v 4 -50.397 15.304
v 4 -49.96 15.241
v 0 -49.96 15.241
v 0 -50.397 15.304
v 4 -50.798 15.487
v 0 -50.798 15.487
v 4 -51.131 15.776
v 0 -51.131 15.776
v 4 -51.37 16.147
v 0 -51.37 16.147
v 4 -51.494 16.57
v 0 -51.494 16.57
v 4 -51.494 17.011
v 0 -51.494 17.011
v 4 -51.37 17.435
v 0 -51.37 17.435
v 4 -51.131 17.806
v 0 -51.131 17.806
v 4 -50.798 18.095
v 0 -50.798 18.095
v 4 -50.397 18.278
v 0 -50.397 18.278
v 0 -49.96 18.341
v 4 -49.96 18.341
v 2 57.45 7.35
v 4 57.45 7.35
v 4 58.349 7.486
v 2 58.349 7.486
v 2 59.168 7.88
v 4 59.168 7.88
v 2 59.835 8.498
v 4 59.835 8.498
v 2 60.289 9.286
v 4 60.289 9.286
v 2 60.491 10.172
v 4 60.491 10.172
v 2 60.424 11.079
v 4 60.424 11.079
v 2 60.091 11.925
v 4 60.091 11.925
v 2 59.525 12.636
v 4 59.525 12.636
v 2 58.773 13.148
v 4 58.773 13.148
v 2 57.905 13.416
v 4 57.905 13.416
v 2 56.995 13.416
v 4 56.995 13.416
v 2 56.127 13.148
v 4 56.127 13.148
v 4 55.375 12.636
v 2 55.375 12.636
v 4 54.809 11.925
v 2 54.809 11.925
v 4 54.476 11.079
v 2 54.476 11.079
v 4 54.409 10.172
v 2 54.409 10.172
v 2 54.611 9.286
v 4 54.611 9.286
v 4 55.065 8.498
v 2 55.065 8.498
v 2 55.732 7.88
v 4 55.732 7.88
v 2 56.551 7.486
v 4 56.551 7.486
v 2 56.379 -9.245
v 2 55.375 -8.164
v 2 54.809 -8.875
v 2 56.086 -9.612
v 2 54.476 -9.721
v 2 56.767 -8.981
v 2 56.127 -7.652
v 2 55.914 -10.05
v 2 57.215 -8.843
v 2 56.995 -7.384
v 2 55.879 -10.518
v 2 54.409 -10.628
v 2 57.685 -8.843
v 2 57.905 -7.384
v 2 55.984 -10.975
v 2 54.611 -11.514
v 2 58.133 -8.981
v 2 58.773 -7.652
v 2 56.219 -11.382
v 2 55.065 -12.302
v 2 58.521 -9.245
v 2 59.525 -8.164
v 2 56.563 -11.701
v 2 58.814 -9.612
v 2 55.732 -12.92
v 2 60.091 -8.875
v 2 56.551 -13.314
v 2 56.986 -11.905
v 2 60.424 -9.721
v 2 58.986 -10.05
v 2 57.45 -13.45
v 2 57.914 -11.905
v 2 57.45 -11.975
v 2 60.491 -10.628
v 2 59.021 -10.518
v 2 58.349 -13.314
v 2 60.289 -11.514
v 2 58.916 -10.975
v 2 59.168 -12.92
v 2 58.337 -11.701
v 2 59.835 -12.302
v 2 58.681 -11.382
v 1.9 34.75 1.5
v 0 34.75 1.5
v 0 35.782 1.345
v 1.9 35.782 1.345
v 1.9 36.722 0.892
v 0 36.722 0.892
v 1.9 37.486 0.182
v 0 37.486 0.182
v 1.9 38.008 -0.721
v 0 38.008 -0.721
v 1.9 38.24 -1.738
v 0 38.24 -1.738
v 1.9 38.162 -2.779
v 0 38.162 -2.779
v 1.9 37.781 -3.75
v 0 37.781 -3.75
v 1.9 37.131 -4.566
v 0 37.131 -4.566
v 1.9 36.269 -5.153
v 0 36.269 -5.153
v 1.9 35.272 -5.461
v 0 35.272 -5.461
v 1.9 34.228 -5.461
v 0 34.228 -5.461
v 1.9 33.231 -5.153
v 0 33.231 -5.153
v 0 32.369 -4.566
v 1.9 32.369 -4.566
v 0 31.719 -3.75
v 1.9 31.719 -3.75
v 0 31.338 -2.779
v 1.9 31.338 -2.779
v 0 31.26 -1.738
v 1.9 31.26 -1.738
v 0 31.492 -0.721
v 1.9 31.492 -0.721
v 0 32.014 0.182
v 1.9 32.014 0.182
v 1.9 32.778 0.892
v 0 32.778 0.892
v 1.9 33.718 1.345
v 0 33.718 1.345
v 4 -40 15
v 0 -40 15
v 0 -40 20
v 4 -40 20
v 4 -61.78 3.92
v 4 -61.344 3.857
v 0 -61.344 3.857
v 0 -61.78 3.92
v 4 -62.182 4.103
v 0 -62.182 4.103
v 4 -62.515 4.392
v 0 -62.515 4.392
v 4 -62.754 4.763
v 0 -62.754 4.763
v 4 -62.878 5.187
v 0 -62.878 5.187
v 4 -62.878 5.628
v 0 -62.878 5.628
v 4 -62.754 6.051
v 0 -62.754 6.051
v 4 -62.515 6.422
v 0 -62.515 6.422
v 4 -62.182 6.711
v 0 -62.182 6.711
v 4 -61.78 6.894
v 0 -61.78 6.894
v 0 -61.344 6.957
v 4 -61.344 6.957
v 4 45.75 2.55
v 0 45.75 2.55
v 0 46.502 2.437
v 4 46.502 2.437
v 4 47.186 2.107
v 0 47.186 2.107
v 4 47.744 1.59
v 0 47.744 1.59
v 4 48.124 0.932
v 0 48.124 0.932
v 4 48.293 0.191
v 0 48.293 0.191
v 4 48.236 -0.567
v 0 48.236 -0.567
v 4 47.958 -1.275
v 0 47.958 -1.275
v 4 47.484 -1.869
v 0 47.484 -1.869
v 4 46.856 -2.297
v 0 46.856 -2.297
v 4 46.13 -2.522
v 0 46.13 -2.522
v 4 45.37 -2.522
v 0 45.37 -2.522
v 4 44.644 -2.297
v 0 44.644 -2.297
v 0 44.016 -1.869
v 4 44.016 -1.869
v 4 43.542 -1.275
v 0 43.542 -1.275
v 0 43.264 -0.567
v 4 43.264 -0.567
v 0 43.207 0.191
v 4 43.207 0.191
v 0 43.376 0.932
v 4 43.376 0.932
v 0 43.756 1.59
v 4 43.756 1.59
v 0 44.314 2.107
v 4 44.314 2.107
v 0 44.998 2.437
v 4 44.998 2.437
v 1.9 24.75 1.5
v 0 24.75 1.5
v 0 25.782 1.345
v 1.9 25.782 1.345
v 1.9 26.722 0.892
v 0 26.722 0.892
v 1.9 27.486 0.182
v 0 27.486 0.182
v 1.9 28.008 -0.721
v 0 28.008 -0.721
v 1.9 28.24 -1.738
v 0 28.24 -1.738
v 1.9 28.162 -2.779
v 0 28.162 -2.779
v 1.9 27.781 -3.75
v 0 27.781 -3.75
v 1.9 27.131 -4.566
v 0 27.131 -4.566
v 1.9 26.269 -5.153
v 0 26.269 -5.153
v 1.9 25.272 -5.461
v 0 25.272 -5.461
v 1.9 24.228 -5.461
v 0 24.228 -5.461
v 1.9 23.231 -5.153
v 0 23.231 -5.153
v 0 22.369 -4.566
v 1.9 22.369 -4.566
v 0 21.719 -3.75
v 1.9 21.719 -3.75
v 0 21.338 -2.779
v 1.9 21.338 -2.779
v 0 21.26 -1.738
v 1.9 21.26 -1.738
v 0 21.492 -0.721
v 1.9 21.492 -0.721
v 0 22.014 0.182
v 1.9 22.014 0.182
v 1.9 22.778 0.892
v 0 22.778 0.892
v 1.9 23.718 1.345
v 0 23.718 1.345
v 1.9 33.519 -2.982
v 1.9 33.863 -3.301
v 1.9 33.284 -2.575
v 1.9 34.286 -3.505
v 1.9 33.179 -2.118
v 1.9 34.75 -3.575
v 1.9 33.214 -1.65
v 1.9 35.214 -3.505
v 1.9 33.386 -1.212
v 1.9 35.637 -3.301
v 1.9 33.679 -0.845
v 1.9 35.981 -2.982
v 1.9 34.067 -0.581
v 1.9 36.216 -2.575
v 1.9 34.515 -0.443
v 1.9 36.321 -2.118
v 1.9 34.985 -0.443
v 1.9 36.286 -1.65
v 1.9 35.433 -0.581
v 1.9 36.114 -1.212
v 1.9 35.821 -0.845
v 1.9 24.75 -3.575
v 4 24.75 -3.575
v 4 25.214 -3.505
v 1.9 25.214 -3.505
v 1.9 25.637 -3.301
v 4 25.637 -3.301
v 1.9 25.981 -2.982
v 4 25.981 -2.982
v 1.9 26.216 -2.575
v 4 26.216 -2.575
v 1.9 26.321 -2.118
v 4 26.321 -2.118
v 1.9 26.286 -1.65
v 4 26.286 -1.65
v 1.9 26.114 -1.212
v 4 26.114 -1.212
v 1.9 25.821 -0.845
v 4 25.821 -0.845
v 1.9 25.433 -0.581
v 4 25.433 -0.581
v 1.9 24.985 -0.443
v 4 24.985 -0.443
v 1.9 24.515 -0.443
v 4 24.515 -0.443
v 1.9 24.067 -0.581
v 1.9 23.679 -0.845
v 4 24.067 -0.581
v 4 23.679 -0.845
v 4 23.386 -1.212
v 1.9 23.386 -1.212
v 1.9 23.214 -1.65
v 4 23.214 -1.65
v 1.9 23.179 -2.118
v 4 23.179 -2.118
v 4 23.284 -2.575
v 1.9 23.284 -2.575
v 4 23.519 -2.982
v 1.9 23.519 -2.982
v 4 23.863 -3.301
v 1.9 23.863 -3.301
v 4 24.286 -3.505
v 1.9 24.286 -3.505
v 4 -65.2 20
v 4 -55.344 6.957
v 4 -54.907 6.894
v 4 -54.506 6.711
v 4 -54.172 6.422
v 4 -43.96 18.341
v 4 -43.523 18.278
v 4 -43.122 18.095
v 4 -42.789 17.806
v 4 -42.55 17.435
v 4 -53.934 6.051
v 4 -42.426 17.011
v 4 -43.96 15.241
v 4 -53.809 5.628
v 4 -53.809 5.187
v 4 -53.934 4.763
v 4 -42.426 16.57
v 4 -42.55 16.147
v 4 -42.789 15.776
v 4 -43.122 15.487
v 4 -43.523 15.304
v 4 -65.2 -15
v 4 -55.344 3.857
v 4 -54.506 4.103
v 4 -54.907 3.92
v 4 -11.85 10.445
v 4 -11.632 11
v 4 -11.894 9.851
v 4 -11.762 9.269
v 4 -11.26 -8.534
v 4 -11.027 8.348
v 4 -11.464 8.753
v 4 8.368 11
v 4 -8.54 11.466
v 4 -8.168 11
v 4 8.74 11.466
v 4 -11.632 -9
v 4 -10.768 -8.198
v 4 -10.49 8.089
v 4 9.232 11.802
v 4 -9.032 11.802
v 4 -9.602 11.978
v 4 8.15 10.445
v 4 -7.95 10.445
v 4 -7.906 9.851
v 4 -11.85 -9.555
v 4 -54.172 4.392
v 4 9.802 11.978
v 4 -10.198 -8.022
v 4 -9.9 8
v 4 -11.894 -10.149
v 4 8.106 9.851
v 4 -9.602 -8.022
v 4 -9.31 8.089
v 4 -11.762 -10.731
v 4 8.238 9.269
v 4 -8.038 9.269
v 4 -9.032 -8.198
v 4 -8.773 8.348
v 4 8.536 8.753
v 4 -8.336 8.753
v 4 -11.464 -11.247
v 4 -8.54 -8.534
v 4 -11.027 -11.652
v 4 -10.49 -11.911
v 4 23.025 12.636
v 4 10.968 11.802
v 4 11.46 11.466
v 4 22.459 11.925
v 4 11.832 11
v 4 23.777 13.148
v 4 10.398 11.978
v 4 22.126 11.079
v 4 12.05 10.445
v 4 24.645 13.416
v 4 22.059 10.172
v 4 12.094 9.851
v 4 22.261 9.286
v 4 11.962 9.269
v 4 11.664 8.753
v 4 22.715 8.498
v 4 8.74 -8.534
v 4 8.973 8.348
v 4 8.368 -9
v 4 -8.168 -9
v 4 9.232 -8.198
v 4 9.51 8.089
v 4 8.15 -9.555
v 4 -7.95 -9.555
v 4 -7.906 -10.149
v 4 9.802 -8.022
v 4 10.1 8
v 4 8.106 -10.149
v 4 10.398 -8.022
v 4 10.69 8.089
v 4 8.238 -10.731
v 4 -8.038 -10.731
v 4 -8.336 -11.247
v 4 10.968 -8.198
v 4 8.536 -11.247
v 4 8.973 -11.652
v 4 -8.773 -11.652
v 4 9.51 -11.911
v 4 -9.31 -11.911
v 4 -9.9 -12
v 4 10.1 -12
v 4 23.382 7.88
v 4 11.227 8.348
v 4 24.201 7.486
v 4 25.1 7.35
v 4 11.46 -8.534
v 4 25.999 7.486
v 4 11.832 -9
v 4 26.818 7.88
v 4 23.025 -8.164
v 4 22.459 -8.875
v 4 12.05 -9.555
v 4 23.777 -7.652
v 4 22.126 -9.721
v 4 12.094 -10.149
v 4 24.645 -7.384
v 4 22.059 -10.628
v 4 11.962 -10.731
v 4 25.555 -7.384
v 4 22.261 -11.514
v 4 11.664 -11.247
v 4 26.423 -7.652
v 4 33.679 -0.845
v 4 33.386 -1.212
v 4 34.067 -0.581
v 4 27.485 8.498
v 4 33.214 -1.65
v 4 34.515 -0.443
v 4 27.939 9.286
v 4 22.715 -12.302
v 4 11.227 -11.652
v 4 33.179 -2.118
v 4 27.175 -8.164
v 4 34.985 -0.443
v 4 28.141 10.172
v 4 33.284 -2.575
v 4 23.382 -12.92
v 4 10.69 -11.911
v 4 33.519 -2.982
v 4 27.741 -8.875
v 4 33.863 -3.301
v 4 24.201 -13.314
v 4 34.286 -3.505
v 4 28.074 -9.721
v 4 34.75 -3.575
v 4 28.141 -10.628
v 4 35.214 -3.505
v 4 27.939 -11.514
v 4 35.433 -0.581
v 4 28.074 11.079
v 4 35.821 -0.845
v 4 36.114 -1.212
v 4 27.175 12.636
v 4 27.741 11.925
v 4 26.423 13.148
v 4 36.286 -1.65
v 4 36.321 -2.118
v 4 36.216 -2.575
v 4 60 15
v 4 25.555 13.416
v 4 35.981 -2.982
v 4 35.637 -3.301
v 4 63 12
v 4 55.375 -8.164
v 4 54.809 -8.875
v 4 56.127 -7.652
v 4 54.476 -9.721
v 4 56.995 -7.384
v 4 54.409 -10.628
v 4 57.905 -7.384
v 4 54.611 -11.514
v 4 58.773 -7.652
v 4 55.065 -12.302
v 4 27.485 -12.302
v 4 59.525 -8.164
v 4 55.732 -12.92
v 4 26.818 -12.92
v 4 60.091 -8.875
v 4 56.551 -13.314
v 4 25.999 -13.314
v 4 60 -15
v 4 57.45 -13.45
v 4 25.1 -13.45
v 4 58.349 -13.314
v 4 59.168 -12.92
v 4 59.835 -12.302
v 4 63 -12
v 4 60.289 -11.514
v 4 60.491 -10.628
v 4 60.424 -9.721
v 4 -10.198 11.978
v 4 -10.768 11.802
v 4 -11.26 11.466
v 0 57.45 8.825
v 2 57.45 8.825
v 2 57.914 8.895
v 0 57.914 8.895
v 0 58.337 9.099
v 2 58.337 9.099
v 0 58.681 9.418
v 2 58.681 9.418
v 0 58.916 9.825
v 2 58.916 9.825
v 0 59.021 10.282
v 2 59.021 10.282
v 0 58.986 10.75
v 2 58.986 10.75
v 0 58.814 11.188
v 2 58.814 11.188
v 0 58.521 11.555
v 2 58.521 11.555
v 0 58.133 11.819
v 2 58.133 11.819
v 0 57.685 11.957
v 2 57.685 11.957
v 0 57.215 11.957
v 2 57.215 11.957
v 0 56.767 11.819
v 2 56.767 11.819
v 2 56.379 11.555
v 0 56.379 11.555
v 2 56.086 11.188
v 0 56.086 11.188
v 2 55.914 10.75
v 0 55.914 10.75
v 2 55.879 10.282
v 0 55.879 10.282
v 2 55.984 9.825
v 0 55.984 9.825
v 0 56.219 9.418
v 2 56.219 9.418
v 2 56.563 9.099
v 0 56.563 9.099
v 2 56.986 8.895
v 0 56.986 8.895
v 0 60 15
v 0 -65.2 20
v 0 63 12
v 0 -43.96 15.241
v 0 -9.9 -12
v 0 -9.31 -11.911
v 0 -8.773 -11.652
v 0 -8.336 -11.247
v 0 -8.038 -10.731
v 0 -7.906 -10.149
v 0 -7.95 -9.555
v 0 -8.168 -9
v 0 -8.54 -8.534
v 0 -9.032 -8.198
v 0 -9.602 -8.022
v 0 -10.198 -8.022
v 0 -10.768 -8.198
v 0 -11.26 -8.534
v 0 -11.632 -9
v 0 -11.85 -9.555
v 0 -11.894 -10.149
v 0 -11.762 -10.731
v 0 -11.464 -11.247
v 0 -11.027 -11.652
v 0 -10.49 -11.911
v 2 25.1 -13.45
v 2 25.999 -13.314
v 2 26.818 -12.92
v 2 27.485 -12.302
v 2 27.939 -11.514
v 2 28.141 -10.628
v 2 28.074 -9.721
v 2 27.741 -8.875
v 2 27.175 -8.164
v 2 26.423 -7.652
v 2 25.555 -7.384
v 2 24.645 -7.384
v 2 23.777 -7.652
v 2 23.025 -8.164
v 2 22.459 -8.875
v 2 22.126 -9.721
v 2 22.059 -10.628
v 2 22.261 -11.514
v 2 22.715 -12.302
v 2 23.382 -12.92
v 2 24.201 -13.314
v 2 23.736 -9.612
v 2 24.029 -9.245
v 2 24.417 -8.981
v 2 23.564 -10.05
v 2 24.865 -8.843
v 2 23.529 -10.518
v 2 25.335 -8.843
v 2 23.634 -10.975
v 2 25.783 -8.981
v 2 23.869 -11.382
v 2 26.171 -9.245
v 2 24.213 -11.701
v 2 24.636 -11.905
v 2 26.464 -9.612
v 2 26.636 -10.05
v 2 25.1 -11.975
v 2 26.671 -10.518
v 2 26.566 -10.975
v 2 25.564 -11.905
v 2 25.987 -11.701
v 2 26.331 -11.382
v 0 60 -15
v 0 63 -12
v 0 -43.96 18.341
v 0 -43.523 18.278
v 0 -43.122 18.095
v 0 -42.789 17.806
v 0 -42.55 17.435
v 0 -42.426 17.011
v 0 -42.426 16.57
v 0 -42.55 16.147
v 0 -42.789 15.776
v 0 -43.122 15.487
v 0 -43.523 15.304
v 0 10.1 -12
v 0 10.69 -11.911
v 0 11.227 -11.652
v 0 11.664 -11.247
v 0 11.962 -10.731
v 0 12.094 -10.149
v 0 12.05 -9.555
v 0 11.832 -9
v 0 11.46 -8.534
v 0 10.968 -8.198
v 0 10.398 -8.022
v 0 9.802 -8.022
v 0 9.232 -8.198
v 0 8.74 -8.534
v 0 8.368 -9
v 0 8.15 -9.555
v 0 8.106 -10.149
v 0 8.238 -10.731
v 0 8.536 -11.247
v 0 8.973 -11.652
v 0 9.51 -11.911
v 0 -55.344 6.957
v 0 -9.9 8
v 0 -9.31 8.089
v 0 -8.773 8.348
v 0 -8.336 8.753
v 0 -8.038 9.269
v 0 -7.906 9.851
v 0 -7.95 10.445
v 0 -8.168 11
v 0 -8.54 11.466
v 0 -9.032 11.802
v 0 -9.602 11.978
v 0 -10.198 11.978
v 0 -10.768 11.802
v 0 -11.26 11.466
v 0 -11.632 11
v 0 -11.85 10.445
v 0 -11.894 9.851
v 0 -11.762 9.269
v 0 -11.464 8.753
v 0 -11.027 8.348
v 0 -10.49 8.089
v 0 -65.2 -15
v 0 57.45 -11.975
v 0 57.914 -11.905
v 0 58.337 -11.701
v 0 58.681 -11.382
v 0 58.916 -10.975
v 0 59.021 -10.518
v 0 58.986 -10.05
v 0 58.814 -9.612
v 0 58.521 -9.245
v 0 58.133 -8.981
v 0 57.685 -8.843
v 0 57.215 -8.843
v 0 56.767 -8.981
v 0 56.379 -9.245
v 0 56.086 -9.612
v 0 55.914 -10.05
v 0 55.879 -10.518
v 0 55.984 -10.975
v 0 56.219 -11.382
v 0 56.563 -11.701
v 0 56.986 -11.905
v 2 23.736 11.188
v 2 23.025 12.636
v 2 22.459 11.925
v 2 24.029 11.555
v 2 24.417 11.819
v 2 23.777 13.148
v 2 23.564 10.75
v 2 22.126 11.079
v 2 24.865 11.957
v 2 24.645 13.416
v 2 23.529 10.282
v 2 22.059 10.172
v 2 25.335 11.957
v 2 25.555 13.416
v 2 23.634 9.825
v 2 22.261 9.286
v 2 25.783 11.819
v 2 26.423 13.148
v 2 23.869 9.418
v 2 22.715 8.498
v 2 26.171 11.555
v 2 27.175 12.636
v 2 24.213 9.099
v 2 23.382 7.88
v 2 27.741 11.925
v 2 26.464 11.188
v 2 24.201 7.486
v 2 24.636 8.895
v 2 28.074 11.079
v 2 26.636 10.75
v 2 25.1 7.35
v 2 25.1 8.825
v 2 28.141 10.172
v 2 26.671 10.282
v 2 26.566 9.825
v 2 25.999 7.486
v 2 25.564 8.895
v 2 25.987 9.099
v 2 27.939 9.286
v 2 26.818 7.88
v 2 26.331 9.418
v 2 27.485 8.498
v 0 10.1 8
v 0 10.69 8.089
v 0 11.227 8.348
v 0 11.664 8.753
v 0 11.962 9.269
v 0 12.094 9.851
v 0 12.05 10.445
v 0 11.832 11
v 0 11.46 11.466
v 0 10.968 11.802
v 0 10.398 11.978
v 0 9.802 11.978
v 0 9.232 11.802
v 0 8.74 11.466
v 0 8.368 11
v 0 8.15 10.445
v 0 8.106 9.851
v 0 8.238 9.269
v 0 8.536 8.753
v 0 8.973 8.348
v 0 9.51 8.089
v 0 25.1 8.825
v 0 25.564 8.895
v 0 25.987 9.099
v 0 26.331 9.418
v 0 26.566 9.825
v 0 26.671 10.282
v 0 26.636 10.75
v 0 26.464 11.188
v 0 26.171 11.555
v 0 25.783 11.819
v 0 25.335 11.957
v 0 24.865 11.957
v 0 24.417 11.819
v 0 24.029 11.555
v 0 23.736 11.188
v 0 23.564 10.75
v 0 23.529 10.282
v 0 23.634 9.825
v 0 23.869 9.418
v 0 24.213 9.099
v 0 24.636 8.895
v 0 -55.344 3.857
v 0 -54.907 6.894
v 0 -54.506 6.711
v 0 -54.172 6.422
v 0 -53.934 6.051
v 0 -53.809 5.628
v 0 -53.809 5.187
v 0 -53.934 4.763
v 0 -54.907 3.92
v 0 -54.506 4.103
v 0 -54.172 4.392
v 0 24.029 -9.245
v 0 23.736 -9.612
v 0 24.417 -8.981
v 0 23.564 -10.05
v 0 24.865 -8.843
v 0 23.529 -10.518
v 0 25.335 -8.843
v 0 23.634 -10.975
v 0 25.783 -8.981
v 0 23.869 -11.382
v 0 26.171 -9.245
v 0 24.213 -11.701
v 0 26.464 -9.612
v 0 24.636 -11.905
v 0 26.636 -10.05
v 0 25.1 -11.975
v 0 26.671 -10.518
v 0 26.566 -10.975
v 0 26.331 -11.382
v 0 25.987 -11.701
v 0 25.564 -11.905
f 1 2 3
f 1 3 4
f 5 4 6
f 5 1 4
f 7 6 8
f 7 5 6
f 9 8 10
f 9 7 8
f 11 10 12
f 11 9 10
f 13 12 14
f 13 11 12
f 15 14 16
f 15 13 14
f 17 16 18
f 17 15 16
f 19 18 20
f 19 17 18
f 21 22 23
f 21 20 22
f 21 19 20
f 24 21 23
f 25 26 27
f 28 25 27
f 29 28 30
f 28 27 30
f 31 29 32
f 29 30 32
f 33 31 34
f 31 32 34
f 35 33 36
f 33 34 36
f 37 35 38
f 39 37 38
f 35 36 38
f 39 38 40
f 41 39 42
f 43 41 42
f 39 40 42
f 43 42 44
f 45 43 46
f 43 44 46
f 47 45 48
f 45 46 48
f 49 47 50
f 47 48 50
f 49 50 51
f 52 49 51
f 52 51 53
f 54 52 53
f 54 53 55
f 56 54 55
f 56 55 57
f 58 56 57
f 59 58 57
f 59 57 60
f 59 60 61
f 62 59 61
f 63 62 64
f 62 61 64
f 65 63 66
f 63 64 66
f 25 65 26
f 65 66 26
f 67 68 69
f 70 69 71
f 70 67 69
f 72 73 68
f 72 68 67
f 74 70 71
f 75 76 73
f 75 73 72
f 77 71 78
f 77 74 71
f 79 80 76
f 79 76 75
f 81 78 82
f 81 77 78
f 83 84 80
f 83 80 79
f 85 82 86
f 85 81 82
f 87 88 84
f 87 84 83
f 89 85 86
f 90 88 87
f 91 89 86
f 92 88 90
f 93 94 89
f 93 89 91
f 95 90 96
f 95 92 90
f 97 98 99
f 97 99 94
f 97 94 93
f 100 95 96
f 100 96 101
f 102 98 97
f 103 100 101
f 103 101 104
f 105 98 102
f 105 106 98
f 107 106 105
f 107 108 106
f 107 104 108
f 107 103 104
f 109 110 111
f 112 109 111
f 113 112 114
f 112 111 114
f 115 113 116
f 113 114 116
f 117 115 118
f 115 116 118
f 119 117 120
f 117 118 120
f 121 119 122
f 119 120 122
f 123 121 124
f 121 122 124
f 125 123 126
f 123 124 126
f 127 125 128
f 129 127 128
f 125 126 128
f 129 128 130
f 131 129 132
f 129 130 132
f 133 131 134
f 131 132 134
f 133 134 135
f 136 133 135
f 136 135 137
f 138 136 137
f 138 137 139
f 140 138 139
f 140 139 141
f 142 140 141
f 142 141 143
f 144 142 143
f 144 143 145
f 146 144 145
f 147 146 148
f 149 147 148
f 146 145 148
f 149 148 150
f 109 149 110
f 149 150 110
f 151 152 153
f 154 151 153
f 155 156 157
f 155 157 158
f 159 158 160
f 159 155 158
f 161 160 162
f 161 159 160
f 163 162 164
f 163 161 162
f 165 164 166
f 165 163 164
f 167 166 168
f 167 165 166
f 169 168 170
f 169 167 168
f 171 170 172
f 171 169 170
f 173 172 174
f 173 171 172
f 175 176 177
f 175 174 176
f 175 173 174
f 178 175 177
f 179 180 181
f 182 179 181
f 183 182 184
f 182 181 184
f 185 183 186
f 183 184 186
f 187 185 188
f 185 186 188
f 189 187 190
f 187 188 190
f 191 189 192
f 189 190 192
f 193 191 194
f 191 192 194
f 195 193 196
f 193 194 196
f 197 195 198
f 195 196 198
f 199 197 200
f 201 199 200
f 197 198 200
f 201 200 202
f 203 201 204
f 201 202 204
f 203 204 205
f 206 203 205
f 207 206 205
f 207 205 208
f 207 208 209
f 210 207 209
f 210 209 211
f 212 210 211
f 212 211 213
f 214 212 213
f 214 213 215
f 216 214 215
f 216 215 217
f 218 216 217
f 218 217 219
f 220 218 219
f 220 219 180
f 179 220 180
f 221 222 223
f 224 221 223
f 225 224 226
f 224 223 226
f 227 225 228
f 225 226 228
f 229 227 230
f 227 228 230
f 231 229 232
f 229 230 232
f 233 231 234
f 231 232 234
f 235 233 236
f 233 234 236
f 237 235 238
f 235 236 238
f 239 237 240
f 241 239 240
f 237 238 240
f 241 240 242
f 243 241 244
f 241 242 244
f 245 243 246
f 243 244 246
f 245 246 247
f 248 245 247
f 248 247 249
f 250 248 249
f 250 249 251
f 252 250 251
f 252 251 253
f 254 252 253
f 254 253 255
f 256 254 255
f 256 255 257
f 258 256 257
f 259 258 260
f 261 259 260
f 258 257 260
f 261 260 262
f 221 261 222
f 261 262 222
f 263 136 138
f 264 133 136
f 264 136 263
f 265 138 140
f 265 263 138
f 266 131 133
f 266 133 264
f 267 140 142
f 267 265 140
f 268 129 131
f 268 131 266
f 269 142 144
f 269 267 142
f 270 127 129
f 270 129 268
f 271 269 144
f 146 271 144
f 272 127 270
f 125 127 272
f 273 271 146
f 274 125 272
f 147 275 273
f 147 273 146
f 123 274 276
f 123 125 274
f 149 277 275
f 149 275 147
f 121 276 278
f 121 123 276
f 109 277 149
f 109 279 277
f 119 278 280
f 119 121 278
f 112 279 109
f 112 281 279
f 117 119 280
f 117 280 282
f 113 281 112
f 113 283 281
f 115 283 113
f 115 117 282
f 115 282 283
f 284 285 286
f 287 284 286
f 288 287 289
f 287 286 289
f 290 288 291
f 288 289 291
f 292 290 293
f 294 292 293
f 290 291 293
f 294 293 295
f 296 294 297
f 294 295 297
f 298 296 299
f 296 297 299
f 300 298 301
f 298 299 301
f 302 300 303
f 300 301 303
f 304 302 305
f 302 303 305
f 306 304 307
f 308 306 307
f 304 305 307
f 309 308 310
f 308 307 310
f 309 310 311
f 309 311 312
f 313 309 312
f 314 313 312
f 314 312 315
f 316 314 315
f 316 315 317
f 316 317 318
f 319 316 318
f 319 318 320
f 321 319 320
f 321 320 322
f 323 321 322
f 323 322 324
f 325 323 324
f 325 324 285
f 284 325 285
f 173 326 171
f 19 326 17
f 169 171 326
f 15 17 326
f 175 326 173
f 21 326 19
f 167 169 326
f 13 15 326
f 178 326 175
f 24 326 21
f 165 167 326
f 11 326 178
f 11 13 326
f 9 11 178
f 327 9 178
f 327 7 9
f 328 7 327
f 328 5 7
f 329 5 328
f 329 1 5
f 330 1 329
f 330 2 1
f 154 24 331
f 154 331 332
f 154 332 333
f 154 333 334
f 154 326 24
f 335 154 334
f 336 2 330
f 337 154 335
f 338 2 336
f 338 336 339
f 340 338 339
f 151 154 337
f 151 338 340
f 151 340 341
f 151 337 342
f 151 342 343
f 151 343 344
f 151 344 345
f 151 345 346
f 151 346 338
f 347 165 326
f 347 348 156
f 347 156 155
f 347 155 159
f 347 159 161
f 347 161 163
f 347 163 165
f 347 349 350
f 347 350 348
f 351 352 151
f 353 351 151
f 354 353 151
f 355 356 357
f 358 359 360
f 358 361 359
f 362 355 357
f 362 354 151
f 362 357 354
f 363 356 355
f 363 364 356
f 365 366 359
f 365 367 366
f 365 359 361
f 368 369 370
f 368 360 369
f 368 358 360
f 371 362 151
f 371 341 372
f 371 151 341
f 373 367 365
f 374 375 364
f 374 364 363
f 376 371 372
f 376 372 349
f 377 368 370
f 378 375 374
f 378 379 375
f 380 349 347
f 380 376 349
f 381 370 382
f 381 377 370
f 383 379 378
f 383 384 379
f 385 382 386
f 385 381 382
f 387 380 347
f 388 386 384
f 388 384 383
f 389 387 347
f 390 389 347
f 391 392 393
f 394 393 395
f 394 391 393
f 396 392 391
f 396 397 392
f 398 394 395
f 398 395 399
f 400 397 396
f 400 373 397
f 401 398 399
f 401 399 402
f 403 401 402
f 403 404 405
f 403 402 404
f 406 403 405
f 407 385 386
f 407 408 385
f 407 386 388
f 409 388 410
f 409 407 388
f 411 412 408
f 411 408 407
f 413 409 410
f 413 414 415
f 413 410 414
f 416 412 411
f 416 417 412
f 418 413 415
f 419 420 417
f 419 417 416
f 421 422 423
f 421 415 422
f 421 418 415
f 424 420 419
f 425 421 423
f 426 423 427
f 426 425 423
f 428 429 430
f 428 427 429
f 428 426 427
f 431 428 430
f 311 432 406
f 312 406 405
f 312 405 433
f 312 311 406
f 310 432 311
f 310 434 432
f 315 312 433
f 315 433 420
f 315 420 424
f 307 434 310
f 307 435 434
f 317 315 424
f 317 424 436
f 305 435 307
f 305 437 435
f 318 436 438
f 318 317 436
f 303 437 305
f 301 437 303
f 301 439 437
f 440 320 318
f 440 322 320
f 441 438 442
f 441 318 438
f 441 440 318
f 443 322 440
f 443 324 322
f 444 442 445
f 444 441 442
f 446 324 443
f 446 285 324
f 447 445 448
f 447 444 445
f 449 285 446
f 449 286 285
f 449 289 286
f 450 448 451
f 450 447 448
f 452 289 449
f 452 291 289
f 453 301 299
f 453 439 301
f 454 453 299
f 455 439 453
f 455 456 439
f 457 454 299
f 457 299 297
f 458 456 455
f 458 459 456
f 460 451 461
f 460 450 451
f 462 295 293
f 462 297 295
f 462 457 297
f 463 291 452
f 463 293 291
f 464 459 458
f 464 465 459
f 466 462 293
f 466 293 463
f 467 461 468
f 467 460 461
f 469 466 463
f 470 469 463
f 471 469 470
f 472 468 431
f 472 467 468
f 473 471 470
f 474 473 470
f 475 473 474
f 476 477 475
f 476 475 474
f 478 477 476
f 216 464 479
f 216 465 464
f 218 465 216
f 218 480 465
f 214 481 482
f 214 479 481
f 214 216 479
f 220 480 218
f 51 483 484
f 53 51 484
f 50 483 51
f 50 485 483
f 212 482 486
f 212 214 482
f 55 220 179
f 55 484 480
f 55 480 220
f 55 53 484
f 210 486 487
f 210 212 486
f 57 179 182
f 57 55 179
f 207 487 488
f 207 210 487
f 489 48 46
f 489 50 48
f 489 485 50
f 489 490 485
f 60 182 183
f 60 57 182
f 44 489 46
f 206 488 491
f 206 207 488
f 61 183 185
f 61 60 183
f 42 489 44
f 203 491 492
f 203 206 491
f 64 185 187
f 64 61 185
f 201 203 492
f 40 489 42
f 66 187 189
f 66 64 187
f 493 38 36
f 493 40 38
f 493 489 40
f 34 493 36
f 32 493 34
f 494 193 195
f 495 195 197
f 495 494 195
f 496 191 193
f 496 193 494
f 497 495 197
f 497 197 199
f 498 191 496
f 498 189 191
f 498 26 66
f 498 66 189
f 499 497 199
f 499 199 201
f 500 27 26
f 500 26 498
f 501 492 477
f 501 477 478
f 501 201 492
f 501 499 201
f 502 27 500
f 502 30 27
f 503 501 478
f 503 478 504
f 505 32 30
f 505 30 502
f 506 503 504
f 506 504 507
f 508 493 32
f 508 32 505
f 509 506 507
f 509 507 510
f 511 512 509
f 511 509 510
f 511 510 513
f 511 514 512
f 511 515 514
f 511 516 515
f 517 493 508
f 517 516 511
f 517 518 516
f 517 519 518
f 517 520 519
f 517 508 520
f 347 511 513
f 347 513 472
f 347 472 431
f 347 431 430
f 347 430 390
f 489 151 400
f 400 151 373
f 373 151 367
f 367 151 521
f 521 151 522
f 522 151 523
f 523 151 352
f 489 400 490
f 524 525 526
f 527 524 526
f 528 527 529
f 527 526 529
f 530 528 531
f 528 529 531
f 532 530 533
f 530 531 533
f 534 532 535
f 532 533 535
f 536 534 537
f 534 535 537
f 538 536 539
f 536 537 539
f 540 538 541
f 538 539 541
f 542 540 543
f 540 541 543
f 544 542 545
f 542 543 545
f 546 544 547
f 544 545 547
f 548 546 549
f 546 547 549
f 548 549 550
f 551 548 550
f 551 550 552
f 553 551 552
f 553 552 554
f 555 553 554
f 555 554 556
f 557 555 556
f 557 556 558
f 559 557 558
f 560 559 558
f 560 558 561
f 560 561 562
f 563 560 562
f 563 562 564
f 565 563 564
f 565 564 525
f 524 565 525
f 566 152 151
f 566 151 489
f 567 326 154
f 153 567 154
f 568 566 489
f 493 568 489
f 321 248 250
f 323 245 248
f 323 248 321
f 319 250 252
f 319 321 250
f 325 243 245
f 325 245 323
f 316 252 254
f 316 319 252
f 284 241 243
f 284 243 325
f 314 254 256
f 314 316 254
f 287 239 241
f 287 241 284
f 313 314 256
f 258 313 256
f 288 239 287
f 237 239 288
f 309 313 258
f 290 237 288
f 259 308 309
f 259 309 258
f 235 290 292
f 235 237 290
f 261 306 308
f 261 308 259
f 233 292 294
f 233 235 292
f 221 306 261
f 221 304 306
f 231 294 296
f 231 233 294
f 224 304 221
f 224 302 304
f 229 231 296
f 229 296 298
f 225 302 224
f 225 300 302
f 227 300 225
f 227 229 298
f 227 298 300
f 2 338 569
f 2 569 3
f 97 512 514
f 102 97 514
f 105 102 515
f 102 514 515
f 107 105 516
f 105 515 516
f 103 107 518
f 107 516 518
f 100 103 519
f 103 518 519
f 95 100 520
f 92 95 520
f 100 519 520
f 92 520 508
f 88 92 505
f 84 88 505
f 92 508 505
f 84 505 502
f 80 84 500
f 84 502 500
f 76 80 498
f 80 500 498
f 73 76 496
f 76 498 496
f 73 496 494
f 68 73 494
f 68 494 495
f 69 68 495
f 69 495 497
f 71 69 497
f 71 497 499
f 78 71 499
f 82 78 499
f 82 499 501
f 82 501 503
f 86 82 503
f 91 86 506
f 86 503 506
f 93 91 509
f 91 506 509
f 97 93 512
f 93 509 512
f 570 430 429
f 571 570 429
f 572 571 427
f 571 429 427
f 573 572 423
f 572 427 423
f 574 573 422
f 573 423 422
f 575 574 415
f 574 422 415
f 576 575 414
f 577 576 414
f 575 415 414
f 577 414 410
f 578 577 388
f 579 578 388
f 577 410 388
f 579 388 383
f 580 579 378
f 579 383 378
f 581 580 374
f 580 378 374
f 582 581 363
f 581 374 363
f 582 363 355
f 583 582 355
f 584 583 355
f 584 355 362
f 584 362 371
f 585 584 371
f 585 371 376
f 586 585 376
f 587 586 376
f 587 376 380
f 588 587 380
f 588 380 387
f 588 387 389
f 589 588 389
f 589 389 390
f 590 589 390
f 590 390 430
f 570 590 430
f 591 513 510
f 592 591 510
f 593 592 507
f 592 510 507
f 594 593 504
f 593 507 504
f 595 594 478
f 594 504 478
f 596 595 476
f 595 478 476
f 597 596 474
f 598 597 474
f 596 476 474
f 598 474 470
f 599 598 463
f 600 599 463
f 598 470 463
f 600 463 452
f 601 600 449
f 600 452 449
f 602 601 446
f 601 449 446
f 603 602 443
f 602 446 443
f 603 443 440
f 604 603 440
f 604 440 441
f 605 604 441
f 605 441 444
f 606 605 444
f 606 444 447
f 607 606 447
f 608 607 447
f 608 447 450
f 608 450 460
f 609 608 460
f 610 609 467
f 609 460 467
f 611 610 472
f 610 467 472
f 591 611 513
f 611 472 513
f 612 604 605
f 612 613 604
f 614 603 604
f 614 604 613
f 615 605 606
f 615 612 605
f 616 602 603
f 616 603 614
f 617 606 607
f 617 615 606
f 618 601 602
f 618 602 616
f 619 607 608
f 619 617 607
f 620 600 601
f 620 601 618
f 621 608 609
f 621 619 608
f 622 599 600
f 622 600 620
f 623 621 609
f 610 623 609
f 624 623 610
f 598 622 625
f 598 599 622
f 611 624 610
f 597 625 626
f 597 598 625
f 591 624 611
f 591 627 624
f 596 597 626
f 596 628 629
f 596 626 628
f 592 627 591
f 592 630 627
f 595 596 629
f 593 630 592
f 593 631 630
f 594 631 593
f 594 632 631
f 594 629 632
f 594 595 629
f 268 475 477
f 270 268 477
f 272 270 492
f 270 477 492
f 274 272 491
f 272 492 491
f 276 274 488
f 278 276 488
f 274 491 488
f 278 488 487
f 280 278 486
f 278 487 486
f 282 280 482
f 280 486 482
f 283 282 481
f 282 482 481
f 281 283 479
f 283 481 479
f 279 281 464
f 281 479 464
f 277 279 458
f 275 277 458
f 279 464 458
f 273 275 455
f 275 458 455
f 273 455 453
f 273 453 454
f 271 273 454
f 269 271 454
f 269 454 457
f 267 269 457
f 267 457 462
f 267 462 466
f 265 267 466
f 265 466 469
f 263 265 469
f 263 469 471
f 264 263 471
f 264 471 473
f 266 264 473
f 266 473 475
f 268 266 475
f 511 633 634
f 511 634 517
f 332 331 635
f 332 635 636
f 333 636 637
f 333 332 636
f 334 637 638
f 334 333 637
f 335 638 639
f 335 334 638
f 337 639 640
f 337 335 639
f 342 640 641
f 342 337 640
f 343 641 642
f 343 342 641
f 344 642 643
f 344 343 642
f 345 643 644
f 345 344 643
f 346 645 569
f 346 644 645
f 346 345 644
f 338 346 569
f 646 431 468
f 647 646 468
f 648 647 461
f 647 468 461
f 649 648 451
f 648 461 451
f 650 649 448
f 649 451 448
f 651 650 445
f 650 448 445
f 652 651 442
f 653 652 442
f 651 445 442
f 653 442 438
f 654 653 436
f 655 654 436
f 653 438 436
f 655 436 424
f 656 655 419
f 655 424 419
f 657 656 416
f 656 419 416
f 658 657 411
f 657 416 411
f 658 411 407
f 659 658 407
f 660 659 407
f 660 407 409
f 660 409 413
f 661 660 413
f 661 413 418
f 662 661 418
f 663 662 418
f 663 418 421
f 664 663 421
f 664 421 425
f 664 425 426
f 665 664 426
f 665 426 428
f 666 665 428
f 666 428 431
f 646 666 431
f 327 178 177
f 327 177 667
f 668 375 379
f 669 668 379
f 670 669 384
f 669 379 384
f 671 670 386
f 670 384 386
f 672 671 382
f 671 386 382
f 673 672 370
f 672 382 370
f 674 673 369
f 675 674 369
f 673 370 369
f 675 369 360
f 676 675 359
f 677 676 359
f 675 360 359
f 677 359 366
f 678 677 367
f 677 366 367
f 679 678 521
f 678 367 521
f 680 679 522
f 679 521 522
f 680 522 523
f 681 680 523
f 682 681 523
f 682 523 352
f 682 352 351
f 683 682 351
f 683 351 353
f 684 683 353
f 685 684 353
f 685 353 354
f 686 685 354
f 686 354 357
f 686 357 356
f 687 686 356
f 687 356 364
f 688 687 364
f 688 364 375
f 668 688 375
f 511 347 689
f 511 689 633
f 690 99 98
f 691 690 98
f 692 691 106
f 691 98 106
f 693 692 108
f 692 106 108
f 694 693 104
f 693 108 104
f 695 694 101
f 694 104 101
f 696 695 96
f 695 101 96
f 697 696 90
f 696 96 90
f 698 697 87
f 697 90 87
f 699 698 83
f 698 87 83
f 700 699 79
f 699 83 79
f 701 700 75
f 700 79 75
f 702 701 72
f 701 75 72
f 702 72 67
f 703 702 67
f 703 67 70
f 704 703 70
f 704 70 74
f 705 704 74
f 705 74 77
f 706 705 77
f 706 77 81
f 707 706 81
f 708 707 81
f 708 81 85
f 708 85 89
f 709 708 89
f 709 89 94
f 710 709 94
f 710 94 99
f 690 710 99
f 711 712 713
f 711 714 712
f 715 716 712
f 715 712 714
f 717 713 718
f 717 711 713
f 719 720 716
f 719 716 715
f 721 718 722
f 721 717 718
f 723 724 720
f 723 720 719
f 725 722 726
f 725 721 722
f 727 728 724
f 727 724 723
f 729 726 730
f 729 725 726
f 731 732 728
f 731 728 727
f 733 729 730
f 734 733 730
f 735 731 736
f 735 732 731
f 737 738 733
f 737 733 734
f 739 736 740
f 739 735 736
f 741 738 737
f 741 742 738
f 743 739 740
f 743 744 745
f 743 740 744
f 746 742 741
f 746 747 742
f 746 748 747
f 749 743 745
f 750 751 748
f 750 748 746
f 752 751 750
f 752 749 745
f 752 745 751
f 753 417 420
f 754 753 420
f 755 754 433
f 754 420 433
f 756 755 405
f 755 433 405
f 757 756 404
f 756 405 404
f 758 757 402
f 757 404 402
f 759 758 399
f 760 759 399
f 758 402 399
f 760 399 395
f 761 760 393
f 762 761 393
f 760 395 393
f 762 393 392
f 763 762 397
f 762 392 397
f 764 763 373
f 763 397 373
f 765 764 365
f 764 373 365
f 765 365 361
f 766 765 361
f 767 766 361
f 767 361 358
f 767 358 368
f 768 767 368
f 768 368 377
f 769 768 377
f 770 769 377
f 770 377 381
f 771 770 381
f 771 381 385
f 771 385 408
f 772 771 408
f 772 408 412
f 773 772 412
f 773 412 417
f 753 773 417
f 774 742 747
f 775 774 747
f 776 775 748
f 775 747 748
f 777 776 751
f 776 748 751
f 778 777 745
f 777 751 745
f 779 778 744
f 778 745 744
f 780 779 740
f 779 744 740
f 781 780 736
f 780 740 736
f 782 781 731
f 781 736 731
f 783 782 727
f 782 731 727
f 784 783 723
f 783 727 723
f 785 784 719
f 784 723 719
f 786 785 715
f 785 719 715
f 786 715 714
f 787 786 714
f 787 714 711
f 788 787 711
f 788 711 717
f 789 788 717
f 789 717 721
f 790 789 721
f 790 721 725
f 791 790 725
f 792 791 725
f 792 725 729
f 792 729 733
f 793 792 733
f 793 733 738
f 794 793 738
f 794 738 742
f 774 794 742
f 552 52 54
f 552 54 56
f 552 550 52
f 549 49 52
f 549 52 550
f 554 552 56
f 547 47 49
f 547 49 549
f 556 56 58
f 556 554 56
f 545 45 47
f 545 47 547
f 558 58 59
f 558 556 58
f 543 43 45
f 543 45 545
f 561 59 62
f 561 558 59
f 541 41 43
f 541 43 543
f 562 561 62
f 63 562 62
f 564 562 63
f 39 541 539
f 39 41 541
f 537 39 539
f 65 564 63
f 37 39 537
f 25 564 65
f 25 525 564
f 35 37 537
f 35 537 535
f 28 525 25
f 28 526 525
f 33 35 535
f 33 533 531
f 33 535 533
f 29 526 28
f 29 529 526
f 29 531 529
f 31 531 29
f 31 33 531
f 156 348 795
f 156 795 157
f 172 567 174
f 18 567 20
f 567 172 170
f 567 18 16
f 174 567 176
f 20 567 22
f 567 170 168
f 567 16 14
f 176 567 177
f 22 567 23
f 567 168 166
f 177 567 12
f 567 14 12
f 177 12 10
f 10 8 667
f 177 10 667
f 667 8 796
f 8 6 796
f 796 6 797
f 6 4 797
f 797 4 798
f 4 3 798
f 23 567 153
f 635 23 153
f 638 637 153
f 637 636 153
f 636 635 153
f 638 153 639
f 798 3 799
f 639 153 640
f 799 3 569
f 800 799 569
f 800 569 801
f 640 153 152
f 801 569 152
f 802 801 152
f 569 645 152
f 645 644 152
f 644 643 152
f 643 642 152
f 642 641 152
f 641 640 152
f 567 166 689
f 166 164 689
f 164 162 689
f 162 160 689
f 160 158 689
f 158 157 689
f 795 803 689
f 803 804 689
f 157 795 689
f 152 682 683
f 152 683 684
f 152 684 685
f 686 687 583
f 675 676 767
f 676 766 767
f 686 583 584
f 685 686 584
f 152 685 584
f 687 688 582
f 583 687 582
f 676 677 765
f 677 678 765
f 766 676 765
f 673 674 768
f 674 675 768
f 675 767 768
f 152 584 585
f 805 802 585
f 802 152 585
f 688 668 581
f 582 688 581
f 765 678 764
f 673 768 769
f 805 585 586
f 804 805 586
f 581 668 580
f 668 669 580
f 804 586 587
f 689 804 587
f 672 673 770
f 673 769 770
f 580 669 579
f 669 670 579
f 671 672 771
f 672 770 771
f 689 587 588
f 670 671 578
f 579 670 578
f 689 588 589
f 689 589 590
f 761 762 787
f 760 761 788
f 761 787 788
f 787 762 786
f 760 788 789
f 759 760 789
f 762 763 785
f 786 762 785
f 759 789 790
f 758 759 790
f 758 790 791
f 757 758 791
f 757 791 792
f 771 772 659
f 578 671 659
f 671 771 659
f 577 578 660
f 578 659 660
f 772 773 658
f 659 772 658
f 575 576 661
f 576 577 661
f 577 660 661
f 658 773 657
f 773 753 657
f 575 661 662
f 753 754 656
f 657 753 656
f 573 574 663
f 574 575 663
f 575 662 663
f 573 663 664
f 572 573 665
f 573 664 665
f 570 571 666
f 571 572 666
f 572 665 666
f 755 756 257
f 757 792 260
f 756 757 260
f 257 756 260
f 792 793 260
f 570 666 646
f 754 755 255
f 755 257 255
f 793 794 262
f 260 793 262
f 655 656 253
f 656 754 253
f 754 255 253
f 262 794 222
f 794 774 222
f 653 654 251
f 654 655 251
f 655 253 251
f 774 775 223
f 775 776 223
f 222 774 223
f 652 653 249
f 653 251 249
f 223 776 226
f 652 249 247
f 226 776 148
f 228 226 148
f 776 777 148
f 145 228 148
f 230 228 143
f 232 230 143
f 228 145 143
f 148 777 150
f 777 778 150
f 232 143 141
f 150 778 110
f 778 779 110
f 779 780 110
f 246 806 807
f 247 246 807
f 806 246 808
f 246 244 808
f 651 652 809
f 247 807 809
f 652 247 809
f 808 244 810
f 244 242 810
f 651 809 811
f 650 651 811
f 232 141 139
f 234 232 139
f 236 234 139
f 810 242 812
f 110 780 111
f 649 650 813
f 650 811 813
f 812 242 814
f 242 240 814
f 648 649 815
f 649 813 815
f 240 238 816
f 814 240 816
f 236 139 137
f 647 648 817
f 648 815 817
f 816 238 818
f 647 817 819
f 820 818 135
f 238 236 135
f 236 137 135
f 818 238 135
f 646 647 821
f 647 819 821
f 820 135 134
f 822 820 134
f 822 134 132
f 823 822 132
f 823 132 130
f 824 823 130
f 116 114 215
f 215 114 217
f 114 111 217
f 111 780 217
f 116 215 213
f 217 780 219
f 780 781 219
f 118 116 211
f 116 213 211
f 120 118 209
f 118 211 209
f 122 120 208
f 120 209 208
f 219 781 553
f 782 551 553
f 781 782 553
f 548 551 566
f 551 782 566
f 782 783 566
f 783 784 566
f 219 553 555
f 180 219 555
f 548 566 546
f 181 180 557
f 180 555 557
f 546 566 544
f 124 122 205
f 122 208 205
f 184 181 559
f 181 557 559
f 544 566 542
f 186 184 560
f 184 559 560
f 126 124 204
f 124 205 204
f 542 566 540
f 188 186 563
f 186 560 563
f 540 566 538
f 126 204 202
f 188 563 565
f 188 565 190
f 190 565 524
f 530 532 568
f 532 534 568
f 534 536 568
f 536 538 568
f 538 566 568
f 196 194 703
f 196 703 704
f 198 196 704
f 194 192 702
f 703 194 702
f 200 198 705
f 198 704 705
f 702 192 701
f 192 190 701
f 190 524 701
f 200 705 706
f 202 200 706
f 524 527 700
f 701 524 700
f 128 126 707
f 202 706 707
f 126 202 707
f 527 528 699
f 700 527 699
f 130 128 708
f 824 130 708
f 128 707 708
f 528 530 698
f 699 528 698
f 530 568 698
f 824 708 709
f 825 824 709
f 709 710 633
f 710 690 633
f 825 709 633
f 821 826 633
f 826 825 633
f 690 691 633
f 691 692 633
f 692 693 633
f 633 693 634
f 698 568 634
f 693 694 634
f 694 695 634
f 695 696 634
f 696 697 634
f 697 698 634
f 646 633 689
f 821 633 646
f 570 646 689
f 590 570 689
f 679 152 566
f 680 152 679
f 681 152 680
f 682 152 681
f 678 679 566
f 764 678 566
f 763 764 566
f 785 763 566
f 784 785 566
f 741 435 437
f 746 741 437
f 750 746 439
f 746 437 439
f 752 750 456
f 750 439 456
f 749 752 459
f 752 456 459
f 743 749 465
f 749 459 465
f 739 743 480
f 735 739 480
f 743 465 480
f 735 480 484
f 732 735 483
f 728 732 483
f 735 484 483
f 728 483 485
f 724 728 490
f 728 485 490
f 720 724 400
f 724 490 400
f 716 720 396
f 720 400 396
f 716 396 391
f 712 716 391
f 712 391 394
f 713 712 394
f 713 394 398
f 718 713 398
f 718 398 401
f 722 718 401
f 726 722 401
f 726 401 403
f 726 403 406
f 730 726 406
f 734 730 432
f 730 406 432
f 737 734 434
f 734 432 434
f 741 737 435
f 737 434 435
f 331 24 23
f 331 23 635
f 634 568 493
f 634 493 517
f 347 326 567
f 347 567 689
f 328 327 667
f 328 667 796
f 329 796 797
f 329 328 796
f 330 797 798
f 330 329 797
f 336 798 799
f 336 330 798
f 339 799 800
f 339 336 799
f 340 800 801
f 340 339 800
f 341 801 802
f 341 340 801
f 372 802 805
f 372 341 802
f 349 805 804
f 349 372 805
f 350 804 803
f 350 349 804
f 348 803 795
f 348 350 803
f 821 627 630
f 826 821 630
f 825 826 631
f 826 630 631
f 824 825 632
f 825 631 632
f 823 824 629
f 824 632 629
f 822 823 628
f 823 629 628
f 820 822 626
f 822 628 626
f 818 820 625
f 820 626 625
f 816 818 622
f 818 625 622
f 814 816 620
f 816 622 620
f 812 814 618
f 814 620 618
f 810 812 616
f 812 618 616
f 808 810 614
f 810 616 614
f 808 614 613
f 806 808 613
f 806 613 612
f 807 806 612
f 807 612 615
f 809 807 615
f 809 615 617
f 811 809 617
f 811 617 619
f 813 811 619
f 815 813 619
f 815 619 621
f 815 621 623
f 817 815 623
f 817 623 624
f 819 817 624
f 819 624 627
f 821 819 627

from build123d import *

# Parameters (mm, degrees)
CROQUIS1_W              = 30
CROQUIS1_H              = 126
SALIENTE_EXTRUIR1_DEPTH = 4
CROQUIS3_R              = 2
CORTAR_EXTRUIR2_DEPTH   = 5
CROQUIS8_R              = 2.55
CORTAR_EXTRUIR3_DEPTH   = 5
CROQUIS21_W             = 5
CROQUIS21_H             = 23
SALIENTE_EXTRUIR2_DEPTH = 4
CORTAR_EXTRUIR16_DEPTH  = 5
CROQUIS11_R             = 1.575
CORTAR_EXTRUIR8_DEPTH   = 5
CROQUIS15_R             = 1.575
CORTAR_EXTRUIR11_DEPTH  = 5
CHAFL_N2_SIZE           = 3
CROQUIS19_R             = 3.5
CORTAR_EXTRUIR13_DEPTH  = 1.9
CROQUIS20_R             = 3.05
CORTAR_EXTRUIR14_DEPTH  = 2
CROQUIS24_W             = 35
CROQUIS24_H             = 2.2
SALIENTE_EXTRUIR3_DEPTH = 4


with BuildPart() as part:
    # Croquis1 → Saliente-Extruir1 (new body)
    with BuildSketch(Plane(origin=(0, 0, 0), x_dir=(0, 0, -1), z_dir=(1, 0, 0))):
        Rectangle(CROQUIS1_W, CROQUIS1_H)
    extrude(amount=SALIENTE_EXTRUIR1_DEPTH)

    # Croquis3 → Cortar-Extruir2 (cut, through all)
    with BuildSketch(Plane(origin=(4, 0, 0), x_dir=(0, 0, -1), z_dir=(1, 0, 0))):
        with Locations((-10, 10.1)):
            Circle(CROQUIS3_R)
        with Locations((10, 10.1)):
            Circle(CROQUIS3_R)
        with Locations((-10, -9.9)):
            Circle(CROQUIS3_R)
        with Locations((10, -9.9)):
            Circle(CROQUIS3_R)
    extrude(amount=-CORTAR_EXTRUIR2_DEPTH, mode=Mode.SUBTRACT)

    # Croquis8 → Cortar-Extruir3 (cut, through all)
    with BuildSketch(Plane.ZY):
        with Locations((0, 45.75)):
            Circle(CROQUIS8_R)
    extrude(amount=-CORTAR_EXTRUIR3_DEPTH, mode=Mode.SUBTRACT)

    # Croquis21 → Saliente-Extruir2 (add)
    with BuildSketch(Plane.ZY):
        with Locations((17.5, -51.5)):
            Rectangle(CROQUIS21_W, CROQUIS21_H)
    extrude(amount=-SALIENTE_EXTRUIR2_DEPTH)

    # Croquis23 → Cortar-Extruir16 (cut, through all)
    with BuildSketch(Plane(origin=(4, 0, 0), x_dir=(0, 0, -1), z_dir=(1, 0, 0))):
        with BuildLine():
            Line((-15.240890395, -43.96), (-15.240890395, -49.96))
            ThreePointArc((-15.240890395, -49.96), (-16.790890395, -51.51), (-18.340890395, -49.96))
            Line((-18.340890395, -49.96), (-18.340890395, -43.96))
            ThreePointArc((-18.340890395, -43.96), (-16.790890395, -42.41), (-15.240890395, -43.96))
        make_face()
        with BuildLine():
            Line((-3.857181896, -55.343708499), (-3.857181896, -61.343708499))
            ThreePointArc((-3.857181896, -61.343708499), (-5.407181896, -62.893708499), (-6.957181896, -61.343708499))
            Line((-6.957181896, -61.343708499), (-6.957181896, -55.343708499))
            ThreePointArc((-6.957181896, -55.343708499), (-5.407181896, -53.793708499), (-3.857181896, -55.343708499))
        make_face()
    extrude(amount=-CORTAR_EXTRUIR16_DEPTH, mode=Mode.SUBTRACT)

    # Croquis11 → Cortar-Extruir8 (cut, through all)
    with BuildSketch(Plane(origin=(4, 0, 0), x_dir=(0, 0, -1), z_dir=(1, 0, 0))):
        with Locations((2, 34.75)):
            Circle(CROQUIS11_R)
        with Locations((2, 24.75)):
            Circle(CROQUIS11_R)
    extrude(amount=-CORTAR_EXTRUIR8_DEPTH, mode=Mode.SUBTRACT)

    # Croquis15 → Cortar-Extruir11 (cut, through all)
    with BuildSketch(Plane(origin=(4, 0, 0), x_dir=(0, 0, -1), z_dir=(1, 0, 0))):
        with Locations((-10.4, 57.45)):
            Circle(CROQUIS15_R)
        with Locations((10.4, 57.45)):
            Circle(CROQUIS15_R)
        with Locations((-10.4, 25.1)):
            Circle(CROQUIS15_R)
        with Locations((10.4, 25.1)):
            Circle(CROQUIS15_R)
    extrude(amount=-CORTAR_EXTRUIR11_DEPTH, mode=Mode.SUBTRACT)

    # Chaflán2
    chafl_n2_edges = [part.edges().sort_by_distance(p)[0] for p in [
        (2, 63, -15),
        (2, 63, 15),
    ]]
    chamfer(chafl_n2_edges, length=CHAFL_N2_SIZE)

    # Croquis19 → Cortar-Extruir13 (cut)
    with BuildSketch(Plane.ZY):
        with Locations((-2, 24.75)):
            Circle(CROQUIS19_R)
        with Locations((-2, 34.75)):
            Circle(CROQUIS19_R)
    extrude(amount=-CORTAR_EXTRUIR13_DEPTH, mode=Mode.SUBTRACT)

    # Croquis20 → Cortar-Extruir14 (cut)
    with BuildSketch(Plane(origin=(4, 0, 0), x_dir=(0, 0, -1), z_dir=(1, 0, 0))):
        with Locations((-10.4, 57.45)):
            Circle(CROQUIS20_R)
        with Locations((10.4, 57.45)):
            Circle(CROQUIS20_R)
        with Locations((10.4, 25.1)):
            Circle(CROQUIS20_R)
        with Locations((-10.4, 25.1)):
            Circle(CROQUIS20_R)
    extrude(amount=-CORTAR_EXTRUIR14_DEPTH, mode=Mode.SUBTRACT)

    # Croquis24 → Saliente-Extruir3 (add)
    with BuildSketch(Plane(origin=(4, 0, 0), x_dir=(0, 0, -1), z_dir=(1, 0, 0))):
        with Locations((-2.5, -64.1)):
            Rectangle(CROQUIS24_W, CROQUIS24_H)
    extrude(amount=-SALIENTE_EXTRUIR3_DEPTH)


solid = part.part
